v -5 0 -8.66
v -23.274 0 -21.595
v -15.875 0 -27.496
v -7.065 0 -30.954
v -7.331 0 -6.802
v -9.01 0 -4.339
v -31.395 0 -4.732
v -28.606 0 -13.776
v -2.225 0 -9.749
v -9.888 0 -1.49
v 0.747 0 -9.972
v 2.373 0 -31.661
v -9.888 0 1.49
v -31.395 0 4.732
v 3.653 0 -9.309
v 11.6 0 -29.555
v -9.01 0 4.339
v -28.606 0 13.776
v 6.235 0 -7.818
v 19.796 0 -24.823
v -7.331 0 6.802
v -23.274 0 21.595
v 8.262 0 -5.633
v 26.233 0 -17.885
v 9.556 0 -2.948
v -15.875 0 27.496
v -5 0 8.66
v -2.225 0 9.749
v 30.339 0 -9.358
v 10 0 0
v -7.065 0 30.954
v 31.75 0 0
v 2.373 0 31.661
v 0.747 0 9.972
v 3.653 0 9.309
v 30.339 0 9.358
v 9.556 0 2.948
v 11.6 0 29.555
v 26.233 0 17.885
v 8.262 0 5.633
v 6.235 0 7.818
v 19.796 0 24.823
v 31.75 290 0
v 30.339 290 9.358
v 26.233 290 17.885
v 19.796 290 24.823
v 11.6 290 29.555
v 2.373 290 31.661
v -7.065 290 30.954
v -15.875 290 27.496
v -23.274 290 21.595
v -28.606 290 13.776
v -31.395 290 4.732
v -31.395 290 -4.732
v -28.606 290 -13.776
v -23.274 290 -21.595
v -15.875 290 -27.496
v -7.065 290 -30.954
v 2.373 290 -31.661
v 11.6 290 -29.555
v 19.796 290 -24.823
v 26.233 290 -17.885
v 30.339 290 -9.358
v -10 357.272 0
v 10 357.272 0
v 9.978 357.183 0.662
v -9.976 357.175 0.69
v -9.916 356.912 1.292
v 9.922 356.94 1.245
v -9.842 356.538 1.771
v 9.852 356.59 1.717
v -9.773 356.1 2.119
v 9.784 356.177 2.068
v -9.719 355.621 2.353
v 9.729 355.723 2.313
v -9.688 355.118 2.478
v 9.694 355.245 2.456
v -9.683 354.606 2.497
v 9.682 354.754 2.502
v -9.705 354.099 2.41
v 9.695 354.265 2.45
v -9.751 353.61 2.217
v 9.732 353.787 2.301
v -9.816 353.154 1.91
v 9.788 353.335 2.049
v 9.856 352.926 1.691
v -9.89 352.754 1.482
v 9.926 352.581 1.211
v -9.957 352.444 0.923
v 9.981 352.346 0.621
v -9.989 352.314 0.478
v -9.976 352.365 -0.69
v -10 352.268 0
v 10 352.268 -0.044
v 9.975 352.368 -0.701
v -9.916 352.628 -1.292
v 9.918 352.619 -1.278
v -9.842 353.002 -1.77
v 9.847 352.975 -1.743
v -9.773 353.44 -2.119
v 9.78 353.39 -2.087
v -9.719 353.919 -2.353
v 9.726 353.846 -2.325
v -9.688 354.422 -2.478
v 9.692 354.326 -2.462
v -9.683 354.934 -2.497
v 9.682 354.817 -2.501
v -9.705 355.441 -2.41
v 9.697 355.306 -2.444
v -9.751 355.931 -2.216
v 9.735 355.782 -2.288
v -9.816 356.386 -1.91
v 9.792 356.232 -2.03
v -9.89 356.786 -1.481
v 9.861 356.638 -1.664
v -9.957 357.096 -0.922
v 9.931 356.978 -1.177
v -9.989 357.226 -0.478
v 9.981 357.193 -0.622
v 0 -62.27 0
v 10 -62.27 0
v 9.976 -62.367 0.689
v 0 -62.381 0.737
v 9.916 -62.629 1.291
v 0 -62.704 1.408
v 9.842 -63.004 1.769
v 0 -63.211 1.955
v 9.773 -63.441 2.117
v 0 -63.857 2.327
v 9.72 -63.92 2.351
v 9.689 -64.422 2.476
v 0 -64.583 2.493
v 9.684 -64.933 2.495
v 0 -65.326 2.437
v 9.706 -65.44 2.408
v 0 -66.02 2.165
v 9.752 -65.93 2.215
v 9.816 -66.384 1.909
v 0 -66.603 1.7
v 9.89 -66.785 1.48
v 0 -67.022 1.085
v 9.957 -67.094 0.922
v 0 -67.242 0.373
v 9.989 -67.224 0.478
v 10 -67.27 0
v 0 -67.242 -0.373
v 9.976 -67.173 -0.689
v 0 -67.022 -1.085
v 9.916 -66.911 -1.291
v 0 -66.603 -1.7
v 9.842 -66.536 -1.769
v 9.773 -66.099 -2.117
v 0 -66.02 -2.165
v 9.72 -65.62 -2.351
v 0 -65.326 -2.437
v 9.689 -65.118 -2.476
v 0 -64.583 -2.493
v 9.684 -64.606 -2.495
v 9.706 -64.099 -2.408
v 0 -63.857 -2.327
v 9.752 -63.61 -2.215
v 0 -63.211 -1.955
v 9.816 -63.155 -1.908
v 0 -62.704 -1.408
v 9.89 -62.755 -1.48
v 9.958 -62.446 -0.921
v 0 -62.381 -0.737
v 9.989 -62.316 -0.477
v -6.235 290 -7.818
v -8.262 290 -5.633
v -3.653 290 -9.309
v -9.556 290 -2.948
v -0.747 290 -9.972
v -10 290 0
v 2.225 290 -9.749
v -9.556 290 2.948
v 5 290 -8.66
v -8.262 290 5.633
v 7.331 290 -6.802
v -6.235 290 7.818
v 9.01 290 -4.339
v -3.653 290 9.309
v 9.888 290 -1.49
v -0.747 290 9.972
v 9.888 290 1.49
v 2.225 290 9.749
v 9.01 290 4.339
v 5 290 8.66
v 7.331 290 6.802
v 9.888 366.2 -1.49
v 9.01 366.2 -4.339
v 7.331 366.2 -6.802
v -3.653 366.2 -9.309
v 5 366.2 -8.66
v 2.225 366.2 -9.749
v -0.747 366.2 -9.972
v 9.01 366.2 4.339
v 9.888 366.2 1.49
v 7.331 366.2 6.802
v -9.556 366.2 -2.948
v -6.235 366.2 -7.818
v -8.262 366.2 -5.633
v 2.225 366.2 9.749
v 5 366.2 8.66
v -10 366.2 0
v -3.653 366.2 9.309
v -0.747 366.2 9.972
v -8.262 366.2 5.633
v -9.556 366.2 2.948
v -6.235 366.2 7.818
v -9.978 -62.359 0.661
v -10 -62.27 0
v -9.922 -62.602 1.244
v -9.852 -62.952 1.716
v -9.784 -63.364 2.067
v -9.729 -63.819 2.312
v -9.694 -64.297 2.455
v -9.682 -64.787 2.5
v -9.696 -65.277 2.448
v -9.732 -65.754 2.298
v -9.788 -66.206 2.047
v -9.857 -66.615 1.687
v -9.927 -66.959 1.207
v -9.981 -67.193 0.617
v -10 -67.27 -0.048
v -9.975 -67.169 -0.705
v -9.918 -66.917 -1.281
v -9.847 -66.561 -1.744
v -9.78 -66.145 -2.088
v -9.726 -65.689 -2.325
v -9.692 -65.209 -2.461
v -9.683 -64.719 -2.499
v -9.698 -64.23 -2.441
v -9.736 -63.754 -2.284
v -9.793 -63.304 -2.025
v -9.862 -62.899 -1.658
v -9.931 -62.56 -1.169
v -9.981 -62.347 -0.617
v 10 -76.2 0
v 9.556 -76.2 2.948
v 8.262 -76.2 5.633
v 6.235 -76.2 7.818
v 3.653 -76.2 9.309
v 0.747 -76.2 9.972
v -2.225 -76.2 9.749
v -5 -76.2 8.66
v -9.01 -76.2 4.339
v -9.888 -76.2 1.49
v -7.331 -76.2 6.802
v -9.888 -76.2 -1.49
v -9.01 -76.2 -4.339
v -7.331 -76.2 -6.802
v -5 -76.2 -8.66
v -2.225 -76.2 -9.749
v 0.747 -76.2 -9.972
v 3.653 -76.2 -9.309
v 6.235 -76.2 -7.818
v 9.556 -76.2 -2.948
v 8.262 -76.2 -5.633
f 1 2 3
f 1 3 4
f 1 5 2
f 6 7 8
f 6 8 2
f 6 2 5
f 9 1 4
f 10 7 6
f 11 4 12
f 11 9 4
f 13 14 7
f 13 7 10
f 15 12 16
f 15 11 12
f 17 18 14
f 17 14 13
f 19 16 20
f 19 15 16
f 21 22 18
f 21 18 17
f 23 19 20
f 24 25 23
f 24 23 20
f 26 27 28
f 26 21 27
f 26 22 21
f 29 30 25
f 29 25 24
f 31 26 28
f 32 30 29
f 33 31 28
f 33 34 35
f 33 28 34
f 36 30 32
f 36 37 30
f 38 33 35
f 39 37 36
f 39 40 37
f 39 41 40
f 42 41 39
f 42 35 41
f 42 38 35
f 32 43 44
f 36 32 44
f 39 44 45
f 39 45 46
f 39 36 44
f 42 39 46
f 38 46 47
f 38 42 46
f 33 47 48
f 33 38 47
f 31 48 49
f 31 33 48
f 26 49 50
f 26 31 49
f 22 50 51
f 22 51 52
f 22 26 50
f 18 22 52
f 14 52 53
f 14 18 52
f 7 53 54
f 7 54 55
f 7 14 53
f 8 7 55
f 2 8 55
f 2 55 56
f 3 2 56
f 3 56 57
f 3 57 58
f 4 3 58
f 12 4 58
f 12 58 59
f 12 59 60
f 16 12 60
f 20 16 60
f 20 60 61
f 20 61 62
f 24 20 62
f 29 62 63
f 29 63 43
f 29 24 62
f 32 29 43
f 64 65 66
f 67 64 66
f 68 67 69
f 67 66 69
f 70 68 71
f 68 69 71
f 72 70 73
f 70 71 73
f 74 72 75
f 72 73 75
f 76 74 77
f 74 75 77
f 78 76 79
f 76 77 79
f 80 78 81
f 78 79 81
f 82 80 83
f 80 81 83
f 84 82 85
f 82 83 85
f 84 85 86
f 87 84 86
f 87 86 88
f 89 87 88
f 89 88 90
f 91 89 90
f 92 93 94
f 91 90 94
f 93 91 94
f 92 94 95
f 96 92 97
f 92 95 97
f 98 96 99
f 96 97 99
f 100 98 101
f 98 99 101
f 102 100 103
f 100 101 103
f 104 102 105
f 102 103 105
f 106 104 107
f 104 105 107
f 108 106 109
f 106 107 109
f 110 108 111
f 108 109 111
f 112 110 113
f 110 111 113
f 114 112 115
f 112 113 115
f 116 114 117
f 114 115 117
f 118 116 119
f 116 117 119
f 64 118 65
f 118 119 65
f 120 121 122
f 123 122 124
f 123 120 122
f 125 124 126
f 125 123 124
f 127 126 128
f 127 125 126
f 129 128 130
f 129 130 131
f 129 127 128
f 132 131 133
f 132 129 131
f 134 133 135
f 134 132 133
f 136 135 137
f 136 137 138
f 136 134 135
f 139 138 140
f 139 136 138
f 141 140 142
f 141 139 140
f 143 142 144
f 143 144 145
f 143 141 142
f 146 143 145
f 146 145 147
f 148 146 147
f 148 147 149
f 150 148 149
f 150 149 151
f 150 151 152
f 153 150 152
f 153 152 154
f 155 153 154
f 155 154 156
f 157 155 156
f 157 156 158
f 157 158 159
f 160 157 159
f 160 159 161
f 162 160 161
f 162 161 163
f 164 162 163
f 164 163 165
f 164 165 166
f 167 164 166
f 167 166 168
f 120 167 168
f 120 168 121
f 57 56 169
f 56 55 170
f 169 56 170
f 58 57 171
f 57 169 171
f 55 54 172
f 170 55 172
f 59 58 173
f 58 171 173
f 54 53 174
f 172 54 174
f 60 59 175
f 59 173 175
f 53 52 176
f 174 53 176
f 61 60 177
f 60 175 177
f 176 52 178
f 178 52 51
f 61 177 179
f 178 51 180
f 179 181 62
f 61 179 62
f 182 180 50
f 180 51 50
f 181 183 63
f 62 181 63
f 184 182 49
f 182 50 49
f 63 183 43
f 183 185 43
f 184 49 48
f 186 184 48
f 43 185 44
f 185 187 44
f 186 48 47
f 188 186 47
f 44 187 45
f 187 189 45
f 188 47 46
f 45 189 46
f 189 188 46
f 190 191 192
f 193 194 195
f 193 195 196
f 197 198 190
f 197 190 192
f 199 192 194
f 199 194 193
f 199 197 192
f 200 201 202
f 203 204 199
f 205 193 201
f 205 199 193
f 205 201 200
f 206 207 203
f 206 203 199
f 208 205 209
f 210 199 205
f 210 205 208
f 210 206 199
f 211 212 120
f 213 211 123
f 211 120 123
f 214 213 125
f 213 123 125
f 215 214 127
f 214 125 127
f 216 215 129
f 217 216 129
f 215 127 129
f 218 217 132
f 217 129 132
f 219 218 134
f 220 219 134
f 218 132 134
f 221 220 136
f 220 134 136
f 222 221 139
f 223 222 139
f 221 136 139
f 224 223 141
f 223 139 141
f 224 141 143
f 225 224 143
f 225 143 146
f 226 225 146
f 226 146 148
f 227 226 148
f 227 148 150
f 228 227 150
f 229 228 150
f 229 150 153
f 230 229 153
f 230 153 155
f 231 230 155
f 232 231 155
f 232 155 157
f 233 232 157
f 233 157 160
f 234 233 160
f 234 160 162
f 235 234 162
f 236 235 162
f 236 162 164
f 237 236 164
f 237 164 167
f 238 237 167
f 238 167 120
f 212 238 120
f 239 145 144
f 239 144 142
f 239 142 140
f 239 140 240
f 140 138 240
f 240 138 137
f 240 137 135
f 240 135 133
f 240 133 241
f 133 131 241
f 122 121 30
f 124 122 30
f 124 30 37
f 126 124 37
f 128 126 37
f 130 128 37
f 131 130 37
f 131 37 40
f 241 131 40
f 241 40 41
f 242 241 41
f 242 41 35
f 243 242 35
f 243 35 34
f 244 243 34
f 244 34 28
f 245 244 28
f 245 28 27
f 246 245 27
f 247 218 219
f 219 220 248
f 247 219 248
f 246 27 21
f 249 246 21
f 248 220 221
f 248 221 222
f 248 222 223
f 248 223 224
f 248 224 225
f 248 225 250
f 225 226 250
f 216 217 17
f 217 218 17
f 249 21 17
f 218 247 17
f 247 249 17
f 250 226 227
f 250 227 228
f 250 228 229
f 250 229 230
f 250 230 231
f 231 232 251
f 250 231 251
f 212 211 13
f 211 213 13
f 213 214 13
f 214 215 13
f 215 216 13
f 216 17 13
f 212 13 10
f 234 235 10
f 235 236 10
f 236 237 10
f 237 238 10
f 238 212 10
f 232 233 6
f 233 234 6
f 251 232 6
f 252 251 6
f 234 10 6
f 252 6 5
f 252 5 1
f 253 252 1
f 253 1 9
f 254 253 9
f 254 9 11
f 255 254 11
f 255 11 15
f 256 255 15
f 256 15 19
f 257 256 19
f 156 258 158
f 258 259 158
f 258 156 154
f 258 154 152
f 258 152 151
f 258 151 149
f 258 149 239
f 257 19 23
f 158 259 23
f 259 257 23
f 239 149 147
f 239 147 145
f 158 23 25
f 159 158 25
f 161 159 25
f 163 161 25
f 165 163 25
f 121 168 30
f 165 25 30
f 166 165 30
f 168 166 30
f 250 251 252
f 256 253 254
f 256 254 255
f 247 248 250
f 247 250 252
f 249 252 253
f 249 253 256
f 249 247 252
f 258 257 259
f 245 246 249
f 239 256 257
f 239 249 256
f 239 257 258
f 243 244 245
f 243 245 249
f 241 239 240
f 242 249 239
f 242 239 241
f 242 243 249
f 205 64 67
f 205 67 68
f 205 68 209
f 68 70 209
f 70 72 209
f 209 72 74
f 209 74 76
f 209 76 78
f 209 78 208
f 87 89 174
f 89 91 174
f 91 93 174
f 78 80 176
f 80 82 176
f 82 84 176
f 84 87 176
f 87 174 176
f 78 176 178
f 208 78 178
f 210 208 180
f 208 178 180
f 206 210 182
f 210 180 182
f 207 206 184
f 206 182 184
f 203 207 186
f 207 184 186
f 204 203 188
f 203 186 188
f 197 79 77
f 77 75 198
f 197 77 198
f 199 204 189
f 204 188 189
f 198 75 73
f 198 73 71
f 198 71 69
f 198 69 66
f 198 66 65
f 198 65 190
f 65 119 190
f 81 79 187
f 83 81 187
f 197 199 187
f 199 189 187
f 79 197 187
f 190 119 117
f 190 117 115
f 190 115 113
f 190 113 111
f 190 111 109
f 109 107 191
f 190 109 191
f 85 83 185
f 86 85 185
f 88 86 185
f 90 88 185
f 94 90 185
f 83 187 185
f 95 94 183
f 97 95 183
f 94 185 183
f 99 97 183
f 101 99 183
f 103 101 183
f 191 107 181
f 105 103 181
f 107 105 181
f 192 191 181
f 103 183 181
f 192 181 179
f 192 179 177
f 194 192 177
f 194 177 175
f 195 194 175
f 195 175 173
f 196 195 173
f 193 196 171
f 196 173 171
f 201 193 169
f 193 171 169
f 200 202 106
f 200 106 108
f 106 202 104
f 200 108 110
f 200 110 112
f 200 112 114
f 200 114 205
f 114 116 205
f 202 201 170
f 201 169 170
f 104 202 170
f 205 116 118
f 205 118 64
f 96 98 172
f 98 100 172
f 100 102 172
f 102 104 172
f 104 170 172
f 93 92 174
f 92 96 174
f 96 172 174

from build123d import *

# Parameters (mm, degrees)
F0_R     = 31.75
F0_R_2   = 10
F1_DEPTH = 290
F2_DEPTH = 76.2
F3_R     = 10
F4_DEPTH = 76.2
F5_R     = 2.5
F5_R_2   = 2.5019
F6_DEPTH = 63.5


with BuildPart() as f1:
    # F0 (on Front) → F1 (new body)
    with BuildSketch(Plane.XZ):
        Circle(F0_R)
        Circle(F0_R_2, mode=Mode.SUBTRACT)
        Circle(F0_R_2)
    extrude(amount=-F1_DEPTH)

    # F0 (on Front) → F2 (join)
    with BuildSketch(Plane.XZ):
        Circle(F0_R_2)
    extrude(amount=F2_DEPTH)

    # F3 (on face) → F4 (join)
    with BuildSketch(Plane(origin=(0, 290, 0), x_dir=(-1, 0, 0), z_dir=(0, 1, 0))):
        Circle(F3_R)
    extrude(amount=F4_DEPTH)

    # F5 (on Right) → F6 (cut, symmetric)
    with BuildSketch(Plane.YZ):
        with Locations((-64.77, 0)):
            Circle(F5_R)
        with Locations((354.77, 0)):
            Circle(F5_R_2)
    extrude(amount=F6_DEPTH, both=True, mode=Mode.SUBTRACT)


solid = f1.part
